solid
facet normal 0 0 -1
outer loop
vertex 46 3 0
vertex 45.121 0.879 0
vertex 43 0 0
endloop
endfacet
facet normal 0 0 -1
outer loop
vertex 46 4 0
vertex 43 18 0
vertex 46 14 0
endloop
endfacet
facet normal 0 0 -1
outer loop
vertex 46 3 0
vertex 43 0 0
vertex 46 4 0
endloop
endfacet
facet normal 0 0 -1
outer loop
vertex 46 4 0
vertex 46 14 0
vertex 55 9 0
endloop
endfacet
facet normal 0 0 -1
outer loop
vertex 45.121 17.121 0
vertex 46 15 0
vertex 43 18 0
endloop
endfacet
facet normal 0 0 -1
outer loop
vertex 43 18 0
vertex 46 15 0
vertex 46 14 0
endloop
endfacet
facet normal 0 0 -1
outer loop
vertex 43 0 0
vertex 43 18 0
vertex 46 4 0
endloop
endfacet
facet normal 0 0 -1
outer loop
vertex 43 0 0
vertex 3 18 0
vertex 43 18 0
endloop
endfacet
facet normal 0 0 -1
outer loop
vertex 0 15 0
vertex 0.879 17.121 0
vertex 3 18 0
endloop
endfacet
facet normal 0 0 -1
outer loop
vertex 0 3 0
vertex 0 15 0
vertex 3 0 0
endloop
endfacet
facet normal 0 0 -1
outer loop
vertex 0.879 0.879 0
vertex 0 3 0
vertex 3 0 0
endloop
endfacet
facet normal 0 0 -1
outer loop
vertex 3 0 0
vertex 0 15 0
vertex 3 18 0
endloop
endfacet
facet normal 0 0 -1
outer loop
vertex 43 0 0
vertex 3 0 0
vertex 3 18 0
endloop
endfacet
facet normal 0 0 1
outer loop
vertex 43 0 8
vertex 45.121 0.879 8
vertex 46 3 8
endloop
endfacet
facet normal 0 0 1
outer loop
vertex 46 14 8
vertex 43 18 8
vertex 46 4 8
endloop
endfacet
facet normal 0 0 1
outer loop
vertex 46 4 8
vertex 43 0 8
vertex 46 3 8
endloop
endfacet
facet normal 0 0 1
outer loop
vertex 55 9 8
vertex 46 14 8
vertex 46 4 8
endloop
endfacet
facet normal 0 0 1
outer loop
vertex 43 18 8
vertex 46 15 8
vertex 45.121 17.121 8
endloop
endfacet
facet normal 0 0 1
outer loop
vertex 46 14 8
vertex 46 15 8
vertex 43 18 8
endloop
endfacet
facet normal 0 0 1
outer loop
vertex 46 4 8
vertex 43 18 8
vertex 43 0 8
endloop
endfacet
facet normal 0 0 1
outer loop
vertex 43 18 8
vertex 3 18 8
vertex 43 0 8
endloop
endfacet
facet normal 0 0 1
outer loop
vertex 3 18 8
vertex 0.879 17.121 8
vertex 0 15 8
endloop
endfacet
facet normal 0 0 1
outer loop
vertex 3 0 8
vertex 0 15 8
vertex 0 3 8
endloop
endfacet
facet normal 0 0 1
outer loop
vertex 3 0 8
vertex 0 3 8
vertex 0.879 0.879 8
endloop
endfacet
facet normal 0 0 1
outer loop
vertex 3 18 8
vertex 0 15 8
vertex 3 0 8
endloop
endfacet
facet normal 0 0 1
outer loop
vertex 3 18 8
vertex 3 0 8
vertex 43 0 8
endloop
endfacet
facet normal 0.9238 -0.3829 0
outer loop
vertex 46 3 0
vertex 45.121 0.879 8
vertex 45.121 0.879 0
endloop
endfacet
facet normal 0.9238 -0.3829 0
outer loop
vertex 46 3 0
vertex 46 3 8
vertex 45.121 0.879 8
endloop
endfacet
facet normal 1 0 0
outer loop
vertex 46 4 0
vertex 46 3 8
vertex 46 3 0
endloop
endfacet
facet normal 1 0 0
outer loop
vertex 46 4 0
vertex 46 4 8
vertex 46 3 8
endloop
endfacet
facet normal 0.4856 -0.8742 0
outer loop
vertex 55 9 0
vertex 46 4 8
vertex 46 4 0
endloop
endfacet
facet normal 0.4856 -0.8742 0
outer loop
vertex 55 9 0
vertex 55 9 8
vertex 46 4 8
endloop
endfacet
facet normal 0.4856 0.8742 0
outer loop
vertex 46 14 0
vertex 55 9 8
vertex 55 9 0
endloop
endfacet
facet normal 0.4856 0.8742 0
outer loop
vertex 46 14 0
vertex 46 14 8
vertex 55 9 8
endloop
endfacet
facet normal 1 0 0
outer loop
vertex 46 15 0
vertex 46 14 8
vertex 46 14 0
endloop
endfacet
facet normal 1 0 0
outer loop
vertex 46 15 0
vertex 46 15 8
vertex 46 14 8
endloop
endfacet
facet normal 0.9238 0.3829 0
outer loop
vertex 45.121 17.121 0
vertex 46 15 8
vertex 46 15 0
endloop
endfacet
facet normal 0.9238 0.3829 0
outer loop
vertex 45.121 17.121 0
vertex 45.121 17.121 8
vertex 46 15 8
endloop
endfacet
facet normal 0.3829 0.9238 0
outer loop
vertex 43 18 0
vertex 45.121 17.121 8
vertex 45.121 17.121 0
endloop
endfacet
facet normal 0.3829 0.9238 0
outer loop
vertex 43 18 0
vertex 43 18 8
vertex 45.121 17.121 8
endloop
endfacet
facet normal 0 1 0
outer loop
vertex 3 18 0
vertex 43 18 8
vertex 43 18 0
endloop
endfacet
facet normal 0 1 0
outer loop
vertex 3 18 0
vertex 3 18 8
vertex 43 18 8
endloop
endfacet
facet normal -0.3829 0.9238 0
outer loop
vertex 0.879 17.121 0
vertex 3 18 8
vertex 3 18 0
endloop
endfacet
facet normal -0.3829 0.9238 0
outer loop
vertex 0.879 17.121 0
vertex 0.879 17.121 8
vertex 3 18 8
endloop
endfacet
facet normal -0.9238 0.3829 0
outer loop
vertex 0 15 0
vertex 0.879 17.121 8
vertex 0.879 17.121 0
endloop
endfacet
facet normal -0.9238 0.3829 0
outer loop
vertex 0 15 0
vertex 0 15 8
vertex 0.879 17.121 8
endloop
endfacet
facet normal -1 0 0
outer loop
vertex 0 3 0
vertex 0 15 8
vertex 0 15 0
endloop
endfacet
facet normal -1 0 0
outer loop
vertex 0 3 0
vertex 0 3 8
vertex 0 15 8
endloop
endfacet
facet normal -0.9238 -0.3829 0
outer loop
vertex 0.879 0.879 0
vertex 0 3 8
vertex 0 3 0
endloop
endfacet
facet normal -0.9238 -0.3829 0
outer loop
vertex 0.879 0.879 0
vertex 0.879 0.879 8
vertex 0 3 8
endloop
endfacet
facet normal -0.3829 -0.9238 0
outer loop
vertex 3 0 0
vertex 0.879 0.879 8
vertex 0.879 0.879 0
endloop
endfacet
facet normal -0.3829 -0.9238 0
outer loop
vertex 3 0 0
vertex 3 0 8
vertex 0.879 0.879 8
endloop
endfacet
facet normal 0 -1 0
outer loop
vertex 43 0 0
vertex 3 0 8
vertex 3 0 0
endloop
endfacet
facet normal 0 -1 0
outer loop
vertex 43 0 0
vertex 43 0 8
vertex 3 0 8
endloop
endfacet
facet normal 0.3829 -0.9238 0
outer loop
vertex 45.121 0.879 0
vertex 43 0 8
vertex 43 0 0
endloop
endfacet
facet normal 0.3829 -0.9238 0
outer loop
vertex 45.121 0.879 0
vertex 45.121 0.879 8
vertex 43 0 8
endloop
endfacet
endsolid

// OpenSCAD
$fn = 32;

// ----------------------------------------------------------------------
// Ratchet pawl: 46 x 18 mm body, beak 9 mm с правого торца
// ----------------------------------------------------------------------

// --- parameters (mm) ---
profile_height = 8;       // extrusion height
profile_points = 15;      // points of the closed outline

profile = [[0, 3], [0.879, 0.879], [3, 0], [43, 0], [45.121, 0.879], [46, 3], [46, 4], [55, 9], [46, 14], [46, 15], [45.121, 17.121], [43, 18], [3, 18], [0.879, 17.121], [0, 15]];  // single closed polygon, 15 points, counter clockwise

// --- the one profile operation ---
linear_extrude(height = profile_height) polygon(points = profile);
